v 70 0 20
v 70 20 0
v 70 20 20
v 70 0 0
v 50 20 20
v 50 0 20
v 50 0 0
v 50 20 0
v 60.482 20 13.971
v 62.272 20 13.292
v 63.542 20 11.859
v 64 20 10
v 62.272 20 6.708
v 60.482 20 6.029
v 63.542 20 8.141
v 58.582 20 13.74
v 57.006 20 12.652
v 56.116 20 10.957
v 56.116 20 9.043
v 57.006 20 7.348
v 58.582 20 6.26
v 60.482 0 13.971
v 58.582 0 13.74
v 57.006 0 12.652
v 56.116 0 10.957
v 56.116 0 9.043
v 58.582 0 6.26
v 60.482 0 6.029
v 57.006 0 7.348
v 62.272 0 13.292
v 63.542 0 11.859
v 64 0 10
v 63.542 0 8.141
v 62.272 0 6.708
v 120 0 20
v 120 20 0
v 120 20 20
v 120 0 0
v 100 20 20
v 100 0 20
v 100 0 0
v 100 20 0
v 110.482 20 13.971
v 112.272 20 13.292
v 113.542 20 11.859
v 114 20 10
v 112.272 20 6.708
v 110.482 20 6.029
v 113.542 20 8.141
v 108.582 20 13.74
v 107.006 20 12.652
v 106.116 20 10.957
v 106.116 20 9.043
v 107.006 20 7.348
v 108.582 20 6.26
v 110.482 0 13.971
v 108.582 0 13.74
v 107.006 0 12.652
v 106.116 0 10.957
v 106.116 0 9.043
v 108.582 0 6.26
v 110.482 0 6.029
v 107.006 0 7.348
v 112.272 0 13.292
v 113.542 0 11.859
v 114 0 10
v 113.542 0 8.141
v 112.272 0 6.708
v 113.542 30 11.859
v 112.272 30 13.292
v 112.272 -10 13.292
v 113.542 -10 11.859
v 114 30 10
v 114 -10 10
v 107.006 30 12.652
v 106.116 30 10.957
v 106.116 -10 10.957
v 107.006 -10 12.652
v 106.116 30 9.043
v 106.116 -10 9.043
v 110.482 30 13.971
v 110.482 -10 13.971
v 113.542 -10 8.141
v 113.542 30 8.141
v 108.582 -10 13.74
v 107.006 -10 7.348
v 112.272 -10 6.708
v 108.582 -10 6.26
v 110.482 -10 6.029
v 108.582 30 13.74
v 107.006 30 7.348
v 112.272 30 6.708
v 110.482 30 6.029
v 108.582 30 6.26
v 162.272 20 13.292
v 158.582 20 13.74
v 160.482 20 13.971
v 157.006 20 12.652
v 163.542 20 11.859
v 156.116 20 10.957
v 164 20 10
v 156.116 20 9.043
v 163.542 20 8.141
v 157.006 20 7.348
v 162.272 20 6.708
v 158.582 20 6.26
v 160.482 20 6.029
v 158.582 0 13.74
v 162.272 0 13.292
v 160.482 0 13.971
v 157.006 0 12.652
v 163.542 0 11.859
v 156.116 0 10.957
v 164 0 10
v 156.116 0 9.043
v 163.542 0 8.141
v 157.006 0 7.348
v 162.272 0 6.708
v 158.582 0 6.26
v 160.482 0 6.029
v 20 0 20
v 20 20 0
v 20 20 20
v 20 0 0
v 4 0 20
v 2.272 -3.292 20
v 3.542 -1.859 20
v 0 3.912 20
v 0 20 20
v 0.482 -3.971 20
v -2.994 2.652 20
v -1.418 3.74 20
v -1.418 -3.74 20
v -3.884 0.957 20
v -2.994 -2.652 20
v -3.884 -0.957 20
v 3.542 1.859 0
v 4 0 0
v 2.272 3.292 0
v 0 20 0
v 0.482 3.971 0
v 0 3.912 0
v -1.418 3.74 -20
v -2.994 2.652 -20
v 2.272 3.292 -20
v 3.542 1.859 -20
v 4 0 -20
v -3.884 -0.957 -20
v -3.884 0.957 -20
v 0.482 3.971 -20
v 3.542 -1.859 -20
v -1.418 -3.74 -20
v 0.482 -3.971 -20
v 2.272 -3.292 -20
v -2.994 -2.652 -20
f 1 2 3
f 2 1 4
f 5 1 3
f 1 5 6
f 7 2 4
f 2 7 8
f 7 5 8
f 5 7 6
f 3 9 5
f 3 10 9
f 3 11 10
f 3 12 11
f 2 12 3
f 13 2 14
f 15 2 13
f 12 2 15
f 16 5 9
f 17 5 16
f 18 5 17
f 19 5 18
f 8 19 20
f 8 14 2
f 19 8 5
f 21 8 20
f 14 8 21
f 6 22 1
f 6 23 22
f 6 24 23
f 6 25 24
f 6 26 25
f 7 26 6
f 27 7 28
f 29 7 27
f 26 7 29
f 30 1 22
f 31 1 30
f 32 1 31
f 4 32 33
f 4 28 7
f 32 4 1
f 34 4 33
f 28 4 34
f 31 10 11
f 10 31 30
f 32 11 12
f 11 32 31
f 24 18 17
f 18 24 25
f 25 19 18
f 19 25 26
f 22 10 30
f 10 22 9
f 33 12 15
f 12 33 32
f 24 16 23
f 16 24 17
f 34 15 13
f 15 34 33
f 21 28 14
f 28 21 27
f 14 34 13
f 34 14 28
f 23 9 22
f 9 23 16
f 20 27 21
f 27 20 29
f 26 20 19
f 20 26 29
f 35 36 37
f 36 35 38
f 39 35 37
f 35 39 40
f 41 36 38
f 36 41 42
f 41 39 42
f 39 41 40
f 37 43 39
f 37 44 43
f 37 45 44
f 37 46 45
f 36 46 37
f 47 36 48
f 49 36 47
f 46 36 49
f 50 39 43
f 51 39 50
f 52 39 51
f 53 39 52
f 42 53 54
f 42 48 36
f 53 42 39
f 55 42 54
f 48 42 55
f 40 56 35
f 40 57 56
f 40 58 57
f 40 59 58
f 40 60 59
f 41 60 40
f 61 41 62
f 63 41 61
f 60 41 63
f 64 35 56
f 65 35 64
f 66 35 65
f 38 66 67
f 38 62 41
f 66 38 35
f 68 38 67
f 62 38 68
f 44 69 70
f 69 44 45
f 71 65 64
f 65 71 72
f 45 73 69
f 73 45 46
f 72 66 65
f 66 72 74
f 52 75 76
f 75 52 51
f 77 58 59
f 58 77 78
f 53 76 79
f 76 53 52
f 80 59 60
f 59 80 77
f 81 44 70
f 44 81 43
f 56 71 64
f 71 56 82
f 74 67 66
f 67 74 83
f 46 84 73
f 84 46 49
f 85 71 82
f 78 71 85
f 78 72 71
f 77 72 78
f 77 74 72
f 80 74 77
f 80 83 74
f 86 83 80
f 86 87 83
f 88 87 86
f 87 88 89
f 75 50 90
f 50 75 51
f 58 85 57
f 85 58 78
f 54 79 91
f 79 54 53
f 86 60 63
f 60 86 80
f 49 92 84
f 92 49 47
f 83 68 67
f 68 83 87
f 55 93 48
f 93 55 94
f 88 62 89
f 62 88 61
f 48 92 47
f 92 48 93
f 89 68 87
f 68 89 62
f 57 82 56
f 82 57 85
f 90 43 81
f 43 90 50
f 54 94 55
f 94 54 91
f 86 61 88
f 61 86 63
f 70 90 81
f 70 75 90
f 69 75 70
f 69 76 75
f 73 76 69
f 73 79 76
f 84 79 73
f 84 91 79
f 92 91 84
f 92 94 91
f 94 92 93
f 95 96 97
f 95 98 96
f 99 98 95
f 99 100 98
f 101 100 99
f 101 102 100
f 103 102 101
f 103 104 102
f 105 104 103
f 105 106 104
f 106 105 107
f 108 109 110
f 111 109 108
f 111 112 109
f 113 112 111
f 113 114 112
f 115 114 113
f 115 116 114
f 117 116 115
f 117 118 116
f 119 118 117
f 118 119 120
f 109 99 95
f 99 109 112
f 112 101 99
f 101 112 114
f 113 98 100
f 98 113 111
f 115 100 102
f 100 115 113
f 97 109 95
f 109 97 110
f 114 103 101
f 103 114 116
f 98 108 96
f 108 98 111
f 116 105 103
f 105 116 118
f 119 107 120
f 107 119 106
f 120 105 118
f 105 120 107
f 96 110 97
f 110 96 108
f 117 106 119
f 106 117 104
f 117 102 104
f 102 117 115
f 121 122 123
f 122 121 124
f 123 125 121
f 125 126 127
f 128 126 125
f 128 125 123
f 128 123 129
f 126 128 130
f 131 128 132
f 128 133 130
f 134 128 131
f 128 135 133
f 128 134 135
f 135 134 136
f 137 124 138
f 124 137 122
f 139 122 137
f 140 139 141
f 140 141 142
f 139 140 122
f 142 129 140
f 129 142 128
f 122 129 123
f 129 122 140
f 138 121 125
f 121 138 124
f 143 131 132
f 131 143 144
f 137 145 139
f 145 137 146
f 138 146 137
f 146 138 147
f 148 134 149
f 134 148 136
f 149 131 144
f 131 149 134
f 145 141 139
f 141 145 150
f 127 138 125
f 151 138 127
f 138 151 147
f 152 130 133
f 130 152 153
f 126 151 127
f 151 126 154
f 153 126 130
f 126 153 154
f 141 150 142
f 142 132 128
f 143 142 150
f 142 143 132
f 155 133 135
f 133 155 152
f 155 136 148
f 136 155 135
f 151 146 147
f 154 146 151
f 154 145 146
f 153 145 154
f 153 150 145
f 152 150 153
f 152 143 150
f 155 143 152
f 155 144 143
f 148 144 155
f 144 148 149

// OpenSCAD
/*
    Constructive_solid_geometry / Demo
    ralf baecker 2020
   
    https://en.wikipedia.org/wiki/Constructive_solid_geometry
    Boolean opperations on solid objects
*/

//$fn=50; //faces 

cube([20,20,20]);
cylinder(r=4,h=40,center=true);


// difference
translate([50,0,0]) {
     difference() {
        cube([20,20,20]);
        translate([10,10,10]) rotate([90,0,0]) cylinder(r=4,h=40,center=true);
    }
    translate([0,0,40] ) rotate([90,0,0]) color("White") text("difference()",size=3);
}

// union
translate([100,0,0]) {
    union() {
        cube([20,20,20]);
        translate([10,10,10]) rotate([90,0,0]) cylinder(r=4,h=40,center=true);
    }
    translate([0,0,40] ) rotate([90,0,0]) color("White") text("union()",size=3);
}

// intersection
translate([150,0,0]) {
    intersection() {
        cube([20,20,20]);
        translate([10,10,10]) rotate([90,0,0]) cylinder(r=4,h=40,center=true);
    }
    translate([0,0,40] ) rotate([90,0,0]) color("White") text("intersection()",size=3);

}
